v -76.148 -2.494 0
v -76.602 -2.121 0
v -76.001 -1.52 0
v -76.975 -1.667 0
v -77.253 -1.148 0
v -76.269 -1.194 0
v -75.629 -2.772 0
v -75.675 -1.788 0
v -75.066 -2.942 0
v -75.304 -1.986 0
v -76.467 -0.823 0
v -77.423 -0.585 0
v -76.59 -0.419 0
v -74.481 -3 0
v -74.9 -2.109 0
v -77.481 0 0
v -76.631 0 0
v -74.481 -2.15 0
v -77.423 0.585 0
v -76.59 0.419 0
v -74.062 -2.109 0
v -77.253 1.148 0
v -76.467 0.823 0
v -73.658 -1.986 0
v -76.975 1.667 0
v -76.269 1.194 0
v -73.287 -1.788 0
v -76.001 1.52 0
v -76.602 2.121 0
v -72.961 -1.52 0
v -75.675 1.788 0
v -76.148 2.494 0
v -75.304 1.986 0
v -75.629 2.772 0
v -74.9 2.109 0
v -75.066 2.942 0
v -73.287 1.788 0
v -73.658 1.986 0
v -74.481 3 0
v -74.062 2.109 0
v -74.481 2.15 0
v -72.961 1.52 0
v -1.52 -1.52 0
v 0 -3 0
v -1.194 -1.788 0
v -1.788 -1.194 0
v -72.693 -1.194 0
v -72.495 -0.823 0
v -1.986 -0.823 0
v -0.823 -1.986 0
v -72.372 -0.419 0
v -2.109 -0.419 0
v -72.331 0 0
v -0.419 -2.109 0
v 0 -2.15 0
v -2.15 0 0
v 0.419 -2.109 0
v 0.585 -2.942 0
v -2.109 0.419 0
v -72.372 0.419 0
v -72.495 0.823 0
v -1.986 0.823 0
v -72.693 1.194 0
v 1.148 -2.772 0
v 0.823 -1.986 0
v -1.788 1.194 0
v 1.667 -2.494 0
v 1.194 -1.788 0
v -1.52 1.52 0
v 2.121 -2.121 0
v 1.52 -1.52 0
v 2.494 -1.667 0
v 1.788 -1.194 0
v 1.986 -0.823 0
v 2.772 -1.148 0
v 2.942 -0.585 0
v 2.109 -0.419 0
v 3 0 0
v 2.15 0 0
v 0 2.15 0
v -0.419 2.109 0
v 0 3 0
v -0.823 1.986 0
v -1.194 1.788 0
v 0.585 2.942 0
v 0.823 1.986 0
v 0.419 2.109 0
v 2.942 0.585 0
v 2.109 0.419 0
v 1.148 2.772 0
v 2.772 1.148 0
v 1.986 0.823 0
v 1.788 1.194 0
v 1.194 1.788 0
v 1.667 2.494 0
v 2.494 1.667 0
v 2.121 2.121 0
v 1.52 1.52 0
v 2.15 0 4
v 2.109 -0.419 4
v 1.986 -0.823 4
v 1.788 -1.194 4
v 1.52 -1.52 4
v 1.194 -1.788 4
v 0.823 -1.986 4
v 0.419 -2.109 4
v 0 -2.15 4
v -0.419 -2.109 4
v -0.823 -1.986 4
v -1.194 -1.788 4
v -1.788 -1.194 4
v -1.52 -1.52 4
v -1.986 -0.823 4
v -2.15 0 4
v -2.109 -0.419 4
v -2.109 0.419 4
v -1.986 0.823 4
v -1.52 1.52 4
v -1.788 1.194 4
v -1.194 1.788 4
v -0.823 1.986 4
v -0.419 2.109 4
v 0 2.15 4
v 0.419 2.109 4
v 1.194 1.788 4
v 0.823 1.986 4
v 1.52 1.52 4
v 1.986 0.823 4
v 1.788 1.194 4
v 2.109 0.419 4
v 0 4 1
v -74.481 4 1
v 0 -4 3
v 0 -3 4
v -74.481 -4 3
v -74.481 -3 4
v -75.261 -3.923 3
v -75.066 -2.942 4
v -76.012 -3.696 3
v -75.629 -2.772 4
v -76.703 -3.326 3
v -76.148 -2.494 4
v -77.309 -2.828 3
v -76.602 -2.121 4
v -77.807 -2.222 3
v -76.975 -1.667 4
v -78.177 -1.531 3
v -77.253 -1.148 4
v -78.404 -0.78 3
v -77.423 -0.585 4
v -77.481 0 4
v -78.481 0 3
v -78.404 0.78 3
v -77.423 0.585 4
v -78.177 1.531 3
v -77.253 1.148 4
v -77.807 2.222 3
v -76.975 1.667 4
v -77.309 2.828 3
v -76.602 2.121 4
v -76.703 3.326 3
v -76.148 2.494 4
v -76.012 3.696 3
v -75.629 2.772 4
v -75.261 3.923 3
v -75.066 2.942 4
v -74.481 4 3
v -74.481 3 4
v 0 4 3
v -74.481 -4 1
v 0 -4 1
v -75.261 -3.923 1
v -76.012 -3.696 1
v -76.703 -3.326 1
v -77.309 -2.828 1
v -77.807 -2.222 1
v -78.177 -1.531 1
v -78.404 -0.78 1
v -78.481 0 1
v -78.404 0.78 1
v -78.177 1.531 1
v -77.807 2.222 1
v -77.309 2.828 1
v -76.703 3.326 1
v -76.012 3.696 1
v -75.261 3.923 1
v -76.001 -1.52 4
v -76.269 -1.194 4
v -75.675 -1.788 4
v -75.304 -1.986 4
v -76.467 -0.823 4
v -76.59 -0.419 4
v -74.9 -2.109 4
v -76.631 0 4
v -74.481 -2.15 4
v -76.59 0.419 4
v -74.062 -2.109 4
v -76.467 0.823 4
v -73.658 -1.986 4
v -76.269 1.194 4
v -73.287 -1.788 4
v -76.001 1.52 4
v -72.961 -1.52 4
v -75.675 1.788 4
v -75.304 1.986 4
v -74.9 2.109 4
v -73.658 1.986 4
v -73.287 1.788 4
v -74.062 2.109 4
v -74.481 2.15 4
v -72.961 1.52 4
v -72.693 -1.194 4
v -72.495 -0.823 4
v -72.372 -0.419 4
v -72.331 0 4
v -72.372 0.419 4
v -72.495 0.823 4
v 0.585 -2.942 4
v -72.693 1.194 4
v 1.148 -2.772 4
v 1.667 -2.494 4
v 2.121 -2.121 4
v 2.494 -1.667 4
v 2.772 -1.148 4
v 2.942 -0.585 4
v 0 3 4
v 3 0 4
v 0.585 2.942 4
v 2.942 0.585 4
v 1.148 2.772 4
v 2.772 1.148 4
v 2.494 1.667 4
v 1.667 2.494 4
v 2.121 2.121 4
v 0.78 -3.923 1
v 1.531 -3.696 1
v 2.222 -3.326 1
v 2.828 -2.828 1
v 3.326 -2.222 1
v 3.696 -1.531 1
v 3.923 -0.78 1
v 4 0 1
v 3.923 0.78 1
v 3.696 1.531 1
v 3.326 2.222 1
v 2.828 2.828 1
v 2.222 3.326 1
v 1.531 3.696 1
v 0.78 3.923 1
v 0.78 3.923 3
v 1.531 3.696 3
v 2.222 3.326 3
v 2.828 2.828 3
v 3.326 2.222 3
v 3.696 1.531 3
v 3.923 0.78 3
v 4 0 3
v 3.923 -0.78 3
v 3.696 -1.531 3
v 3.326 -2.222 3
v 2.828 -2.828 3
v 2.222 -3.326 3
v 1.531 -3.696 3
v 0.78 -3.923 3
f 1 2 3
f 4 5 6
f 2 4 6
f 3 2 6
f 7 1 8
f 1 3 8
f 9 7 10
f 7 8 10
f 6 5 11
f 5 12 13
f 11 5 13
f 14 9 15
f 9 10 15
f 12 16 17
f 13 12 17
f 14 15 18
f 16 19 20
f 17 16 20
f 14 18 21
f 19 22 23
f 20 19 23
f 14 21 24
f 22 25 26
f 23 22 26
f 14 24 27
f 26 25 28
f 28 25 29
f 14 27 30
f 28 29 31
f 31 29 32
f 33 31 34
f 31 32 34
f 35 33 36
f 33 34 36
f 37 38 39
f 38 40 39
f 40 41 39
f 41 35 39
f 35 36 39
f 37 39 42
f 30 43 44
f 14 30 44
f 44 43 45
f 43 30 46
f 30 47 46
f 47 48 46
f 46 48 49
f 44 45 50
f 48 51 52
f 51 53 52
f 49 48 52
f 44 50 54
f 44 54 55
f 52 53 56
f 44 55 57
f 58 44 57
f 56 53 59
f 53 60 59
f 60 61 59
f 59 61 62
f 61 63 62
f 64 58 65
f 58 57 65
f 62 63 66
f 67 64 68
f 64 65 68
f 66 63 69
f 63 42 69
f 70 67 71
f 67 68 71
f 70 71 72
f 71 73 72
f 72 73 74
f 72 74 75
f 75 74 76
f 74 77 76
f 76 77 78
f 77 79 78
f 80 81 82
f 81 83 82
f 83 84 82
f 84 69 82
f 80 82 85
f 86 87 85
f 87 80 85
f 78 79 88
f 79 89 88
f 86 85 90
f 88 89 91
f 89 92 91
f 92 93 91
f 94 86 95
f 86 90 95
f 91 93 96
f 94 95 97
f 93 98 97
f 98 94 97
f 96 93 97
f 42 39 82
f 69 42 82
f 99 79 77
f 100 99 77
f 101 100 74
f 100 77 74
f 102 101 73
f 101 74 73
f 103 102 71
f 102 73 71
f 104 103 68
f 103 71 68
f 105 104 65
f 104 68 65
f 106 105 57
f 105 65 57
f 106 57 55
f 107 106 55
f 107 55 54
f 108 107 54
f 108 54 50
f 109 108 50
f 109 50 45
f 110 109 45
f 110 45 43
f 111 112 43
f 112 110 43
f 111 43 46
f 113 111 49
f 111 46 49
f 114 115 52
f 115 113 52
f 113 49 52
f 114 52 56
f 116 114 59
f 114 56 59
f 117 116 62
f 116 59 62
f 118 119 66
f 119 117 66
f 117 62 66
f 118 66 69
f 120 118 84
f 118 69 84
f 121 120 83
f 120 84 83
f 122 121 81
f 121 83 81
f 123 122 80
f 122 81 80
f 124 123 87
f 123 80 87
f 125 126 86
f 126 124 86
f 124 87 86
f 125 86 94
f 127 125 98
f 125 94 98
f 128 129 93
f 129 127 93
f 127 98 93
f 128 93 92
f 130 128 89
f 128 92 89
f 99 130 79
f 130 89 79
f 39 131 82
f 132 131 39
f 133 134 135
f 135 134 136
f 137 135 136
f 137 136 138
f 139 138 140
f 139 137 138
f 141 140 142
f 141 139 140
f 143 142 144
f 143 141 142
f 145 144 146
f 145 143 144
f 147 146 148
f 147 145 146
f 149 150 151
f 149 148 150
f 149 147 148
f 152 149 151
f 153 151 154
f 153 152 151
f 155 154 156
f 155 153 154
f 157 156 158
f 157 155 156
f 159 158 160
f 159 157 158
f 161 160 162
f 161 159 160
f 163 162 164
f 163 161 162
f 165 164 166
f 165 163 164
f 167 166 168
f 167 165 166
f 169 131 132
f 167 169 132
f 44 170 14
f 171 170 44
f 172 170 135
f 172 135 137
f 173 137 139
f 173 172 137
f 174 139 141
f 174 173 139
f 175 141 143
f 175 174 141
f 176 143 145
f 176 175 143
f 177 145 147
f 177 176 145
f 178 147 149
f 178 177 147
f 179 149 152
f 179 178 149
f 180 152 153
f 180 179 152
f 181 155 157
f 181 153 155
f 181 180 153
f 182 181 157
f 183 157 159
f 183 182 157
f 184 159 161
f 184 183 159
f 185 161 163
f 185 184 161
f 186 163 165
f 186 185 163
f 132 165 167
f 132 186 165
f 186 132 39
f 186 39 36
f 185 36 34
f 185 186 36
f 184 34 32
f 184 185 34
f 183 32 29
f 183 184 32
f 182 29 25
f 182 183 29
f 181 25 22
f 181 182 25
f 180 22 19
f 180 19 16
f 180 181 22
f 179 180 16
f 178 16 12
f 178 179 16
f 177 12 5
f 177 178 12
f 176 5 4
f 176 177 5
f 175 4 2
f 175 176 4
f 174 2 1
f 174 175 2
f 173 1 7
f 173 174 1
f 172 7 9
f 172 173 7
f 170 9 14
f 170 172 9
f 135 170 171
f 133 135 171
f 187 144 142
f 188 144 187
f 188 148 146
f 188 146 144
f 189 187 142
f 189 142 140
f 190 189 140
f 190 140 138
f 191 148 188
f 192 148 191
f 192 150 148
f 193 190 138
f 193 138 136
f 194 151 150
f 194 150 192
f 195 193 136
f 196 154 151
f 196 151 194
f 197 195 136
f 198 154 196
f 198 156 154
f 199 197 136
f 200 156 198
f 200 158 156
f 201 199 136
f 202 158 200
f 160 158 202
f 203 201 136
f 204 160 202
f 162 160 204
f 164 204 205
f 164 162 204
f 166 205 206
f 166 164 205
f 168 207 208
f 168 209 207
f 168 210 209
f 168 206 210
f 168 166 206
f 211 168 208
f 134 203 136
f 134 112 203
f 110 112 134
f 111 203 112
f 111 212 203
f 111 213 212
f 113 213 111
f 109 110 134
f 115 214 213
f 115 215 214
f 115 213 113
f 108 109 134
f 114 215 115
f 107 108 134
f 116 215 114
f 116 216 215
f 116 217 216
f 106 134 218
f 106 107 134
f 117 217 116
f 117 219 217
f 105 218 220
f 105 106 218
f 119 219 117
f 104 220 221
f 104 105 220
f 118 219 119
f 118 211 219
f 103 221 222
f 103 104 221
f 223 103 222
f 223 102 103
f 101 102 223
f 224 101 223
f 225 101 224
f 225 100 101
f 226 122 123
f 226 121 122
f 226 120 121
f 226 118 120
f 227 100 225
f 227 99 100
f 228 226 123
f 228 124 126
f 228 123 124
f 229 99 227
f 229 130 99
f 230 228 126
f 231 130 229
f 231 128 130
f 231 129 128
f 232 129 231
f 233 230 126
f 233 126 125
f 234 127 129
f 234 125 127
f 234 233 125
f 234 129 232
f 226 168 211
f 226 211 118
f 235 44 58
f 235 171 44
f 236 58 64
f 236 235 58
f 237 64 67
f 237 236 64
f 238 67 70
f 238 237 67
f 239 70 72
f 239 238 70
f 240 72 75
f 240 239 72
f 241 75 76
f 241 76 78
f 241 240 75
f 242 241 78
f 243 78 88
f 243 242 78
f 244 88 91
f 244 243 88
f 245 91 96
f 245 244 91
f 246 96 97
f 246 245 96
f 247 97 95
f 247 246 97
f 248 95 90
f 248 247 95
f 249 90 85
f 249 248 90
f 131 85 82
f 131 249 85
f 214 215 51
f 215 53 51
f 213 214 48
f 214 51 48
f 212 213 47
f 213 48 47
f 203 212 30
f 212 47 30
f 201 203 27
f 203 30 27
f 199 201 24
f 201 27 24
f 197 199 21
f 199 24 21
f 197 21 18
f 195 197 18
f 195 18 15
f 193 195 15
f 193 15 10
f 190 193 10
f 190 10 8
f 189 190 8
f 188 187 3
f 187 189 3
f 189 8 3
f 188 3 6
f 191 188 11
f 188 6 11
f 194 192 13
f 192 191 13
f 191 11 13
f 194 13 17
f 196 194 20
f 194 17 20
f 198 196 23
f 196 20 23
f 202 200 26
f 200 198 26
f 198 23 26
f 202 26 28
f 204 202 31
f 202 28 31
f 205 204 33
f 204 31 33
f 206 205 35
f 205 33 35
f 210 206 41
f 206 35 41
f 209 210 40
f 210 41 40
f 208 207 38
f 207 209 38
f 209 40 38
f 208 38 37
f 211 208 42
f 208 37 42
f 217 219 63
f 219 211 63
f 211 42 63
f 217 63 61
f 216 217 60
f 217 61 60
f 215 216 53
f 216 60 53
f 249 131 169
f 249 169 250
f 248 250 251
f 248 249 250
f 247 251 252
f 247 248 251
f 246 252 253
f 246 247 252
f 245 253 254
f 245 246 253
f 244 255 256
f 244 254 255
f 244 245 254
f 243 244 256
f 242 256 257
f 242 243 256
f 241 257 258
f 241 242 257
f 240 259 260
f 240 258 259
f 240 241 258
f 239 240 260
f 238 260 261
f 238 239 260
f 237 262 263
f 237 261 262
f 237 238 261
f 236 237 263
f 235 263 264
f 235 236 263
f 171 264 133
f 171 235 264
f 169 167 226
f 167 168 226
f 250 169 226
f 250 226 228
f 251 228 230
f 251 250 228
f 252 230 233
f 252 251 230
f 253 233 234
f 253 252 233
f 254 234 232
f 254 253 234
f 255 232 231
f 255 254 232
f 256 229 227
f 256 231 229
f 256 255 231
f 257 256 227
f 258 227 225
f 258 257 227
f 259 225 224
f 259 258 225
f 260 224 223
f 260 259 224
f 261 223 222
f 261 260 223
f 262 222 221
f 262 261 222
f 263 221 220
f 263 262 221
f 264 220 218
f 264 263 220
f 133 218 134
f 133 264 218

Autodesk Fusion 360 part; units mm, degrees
sketch "Sketch1" plane through (0, 0, 0) normal (0, 0, 1) x (1, 0, 0)
  circle A0 centre (0, 0) radius 2.15
  circle A1 centre (0, 0) radius 4
  circle A2 centre (-74.481, 0) radius 2.15
  circle A3 centre (-74.481, 0) radius 4
  line L0 (0, 4) -> (-74.481, 4)
  line L1 (-74.481, -4) -> (0, -4)
  dimension "d1" = 4.3
  dimension "d2" = 8
  dimension "d3" = 74.481
  dimension "d4" = 4.3
  dimension "d5" = 8
extrude "Extrude1" add sketch "Sketch1" along normal blind 4
chamfer "Chamfer1" distance 1 angle 45 8 edges at (-37.2405, -4, 4) (4, 0, 4) (-37.2405, 4, 4) (-78.481, 0, 4) (-78.481, 0, 0) (-37.2405, -4, 0) (4, 0, 0) (-37.2405, 4, 0)
